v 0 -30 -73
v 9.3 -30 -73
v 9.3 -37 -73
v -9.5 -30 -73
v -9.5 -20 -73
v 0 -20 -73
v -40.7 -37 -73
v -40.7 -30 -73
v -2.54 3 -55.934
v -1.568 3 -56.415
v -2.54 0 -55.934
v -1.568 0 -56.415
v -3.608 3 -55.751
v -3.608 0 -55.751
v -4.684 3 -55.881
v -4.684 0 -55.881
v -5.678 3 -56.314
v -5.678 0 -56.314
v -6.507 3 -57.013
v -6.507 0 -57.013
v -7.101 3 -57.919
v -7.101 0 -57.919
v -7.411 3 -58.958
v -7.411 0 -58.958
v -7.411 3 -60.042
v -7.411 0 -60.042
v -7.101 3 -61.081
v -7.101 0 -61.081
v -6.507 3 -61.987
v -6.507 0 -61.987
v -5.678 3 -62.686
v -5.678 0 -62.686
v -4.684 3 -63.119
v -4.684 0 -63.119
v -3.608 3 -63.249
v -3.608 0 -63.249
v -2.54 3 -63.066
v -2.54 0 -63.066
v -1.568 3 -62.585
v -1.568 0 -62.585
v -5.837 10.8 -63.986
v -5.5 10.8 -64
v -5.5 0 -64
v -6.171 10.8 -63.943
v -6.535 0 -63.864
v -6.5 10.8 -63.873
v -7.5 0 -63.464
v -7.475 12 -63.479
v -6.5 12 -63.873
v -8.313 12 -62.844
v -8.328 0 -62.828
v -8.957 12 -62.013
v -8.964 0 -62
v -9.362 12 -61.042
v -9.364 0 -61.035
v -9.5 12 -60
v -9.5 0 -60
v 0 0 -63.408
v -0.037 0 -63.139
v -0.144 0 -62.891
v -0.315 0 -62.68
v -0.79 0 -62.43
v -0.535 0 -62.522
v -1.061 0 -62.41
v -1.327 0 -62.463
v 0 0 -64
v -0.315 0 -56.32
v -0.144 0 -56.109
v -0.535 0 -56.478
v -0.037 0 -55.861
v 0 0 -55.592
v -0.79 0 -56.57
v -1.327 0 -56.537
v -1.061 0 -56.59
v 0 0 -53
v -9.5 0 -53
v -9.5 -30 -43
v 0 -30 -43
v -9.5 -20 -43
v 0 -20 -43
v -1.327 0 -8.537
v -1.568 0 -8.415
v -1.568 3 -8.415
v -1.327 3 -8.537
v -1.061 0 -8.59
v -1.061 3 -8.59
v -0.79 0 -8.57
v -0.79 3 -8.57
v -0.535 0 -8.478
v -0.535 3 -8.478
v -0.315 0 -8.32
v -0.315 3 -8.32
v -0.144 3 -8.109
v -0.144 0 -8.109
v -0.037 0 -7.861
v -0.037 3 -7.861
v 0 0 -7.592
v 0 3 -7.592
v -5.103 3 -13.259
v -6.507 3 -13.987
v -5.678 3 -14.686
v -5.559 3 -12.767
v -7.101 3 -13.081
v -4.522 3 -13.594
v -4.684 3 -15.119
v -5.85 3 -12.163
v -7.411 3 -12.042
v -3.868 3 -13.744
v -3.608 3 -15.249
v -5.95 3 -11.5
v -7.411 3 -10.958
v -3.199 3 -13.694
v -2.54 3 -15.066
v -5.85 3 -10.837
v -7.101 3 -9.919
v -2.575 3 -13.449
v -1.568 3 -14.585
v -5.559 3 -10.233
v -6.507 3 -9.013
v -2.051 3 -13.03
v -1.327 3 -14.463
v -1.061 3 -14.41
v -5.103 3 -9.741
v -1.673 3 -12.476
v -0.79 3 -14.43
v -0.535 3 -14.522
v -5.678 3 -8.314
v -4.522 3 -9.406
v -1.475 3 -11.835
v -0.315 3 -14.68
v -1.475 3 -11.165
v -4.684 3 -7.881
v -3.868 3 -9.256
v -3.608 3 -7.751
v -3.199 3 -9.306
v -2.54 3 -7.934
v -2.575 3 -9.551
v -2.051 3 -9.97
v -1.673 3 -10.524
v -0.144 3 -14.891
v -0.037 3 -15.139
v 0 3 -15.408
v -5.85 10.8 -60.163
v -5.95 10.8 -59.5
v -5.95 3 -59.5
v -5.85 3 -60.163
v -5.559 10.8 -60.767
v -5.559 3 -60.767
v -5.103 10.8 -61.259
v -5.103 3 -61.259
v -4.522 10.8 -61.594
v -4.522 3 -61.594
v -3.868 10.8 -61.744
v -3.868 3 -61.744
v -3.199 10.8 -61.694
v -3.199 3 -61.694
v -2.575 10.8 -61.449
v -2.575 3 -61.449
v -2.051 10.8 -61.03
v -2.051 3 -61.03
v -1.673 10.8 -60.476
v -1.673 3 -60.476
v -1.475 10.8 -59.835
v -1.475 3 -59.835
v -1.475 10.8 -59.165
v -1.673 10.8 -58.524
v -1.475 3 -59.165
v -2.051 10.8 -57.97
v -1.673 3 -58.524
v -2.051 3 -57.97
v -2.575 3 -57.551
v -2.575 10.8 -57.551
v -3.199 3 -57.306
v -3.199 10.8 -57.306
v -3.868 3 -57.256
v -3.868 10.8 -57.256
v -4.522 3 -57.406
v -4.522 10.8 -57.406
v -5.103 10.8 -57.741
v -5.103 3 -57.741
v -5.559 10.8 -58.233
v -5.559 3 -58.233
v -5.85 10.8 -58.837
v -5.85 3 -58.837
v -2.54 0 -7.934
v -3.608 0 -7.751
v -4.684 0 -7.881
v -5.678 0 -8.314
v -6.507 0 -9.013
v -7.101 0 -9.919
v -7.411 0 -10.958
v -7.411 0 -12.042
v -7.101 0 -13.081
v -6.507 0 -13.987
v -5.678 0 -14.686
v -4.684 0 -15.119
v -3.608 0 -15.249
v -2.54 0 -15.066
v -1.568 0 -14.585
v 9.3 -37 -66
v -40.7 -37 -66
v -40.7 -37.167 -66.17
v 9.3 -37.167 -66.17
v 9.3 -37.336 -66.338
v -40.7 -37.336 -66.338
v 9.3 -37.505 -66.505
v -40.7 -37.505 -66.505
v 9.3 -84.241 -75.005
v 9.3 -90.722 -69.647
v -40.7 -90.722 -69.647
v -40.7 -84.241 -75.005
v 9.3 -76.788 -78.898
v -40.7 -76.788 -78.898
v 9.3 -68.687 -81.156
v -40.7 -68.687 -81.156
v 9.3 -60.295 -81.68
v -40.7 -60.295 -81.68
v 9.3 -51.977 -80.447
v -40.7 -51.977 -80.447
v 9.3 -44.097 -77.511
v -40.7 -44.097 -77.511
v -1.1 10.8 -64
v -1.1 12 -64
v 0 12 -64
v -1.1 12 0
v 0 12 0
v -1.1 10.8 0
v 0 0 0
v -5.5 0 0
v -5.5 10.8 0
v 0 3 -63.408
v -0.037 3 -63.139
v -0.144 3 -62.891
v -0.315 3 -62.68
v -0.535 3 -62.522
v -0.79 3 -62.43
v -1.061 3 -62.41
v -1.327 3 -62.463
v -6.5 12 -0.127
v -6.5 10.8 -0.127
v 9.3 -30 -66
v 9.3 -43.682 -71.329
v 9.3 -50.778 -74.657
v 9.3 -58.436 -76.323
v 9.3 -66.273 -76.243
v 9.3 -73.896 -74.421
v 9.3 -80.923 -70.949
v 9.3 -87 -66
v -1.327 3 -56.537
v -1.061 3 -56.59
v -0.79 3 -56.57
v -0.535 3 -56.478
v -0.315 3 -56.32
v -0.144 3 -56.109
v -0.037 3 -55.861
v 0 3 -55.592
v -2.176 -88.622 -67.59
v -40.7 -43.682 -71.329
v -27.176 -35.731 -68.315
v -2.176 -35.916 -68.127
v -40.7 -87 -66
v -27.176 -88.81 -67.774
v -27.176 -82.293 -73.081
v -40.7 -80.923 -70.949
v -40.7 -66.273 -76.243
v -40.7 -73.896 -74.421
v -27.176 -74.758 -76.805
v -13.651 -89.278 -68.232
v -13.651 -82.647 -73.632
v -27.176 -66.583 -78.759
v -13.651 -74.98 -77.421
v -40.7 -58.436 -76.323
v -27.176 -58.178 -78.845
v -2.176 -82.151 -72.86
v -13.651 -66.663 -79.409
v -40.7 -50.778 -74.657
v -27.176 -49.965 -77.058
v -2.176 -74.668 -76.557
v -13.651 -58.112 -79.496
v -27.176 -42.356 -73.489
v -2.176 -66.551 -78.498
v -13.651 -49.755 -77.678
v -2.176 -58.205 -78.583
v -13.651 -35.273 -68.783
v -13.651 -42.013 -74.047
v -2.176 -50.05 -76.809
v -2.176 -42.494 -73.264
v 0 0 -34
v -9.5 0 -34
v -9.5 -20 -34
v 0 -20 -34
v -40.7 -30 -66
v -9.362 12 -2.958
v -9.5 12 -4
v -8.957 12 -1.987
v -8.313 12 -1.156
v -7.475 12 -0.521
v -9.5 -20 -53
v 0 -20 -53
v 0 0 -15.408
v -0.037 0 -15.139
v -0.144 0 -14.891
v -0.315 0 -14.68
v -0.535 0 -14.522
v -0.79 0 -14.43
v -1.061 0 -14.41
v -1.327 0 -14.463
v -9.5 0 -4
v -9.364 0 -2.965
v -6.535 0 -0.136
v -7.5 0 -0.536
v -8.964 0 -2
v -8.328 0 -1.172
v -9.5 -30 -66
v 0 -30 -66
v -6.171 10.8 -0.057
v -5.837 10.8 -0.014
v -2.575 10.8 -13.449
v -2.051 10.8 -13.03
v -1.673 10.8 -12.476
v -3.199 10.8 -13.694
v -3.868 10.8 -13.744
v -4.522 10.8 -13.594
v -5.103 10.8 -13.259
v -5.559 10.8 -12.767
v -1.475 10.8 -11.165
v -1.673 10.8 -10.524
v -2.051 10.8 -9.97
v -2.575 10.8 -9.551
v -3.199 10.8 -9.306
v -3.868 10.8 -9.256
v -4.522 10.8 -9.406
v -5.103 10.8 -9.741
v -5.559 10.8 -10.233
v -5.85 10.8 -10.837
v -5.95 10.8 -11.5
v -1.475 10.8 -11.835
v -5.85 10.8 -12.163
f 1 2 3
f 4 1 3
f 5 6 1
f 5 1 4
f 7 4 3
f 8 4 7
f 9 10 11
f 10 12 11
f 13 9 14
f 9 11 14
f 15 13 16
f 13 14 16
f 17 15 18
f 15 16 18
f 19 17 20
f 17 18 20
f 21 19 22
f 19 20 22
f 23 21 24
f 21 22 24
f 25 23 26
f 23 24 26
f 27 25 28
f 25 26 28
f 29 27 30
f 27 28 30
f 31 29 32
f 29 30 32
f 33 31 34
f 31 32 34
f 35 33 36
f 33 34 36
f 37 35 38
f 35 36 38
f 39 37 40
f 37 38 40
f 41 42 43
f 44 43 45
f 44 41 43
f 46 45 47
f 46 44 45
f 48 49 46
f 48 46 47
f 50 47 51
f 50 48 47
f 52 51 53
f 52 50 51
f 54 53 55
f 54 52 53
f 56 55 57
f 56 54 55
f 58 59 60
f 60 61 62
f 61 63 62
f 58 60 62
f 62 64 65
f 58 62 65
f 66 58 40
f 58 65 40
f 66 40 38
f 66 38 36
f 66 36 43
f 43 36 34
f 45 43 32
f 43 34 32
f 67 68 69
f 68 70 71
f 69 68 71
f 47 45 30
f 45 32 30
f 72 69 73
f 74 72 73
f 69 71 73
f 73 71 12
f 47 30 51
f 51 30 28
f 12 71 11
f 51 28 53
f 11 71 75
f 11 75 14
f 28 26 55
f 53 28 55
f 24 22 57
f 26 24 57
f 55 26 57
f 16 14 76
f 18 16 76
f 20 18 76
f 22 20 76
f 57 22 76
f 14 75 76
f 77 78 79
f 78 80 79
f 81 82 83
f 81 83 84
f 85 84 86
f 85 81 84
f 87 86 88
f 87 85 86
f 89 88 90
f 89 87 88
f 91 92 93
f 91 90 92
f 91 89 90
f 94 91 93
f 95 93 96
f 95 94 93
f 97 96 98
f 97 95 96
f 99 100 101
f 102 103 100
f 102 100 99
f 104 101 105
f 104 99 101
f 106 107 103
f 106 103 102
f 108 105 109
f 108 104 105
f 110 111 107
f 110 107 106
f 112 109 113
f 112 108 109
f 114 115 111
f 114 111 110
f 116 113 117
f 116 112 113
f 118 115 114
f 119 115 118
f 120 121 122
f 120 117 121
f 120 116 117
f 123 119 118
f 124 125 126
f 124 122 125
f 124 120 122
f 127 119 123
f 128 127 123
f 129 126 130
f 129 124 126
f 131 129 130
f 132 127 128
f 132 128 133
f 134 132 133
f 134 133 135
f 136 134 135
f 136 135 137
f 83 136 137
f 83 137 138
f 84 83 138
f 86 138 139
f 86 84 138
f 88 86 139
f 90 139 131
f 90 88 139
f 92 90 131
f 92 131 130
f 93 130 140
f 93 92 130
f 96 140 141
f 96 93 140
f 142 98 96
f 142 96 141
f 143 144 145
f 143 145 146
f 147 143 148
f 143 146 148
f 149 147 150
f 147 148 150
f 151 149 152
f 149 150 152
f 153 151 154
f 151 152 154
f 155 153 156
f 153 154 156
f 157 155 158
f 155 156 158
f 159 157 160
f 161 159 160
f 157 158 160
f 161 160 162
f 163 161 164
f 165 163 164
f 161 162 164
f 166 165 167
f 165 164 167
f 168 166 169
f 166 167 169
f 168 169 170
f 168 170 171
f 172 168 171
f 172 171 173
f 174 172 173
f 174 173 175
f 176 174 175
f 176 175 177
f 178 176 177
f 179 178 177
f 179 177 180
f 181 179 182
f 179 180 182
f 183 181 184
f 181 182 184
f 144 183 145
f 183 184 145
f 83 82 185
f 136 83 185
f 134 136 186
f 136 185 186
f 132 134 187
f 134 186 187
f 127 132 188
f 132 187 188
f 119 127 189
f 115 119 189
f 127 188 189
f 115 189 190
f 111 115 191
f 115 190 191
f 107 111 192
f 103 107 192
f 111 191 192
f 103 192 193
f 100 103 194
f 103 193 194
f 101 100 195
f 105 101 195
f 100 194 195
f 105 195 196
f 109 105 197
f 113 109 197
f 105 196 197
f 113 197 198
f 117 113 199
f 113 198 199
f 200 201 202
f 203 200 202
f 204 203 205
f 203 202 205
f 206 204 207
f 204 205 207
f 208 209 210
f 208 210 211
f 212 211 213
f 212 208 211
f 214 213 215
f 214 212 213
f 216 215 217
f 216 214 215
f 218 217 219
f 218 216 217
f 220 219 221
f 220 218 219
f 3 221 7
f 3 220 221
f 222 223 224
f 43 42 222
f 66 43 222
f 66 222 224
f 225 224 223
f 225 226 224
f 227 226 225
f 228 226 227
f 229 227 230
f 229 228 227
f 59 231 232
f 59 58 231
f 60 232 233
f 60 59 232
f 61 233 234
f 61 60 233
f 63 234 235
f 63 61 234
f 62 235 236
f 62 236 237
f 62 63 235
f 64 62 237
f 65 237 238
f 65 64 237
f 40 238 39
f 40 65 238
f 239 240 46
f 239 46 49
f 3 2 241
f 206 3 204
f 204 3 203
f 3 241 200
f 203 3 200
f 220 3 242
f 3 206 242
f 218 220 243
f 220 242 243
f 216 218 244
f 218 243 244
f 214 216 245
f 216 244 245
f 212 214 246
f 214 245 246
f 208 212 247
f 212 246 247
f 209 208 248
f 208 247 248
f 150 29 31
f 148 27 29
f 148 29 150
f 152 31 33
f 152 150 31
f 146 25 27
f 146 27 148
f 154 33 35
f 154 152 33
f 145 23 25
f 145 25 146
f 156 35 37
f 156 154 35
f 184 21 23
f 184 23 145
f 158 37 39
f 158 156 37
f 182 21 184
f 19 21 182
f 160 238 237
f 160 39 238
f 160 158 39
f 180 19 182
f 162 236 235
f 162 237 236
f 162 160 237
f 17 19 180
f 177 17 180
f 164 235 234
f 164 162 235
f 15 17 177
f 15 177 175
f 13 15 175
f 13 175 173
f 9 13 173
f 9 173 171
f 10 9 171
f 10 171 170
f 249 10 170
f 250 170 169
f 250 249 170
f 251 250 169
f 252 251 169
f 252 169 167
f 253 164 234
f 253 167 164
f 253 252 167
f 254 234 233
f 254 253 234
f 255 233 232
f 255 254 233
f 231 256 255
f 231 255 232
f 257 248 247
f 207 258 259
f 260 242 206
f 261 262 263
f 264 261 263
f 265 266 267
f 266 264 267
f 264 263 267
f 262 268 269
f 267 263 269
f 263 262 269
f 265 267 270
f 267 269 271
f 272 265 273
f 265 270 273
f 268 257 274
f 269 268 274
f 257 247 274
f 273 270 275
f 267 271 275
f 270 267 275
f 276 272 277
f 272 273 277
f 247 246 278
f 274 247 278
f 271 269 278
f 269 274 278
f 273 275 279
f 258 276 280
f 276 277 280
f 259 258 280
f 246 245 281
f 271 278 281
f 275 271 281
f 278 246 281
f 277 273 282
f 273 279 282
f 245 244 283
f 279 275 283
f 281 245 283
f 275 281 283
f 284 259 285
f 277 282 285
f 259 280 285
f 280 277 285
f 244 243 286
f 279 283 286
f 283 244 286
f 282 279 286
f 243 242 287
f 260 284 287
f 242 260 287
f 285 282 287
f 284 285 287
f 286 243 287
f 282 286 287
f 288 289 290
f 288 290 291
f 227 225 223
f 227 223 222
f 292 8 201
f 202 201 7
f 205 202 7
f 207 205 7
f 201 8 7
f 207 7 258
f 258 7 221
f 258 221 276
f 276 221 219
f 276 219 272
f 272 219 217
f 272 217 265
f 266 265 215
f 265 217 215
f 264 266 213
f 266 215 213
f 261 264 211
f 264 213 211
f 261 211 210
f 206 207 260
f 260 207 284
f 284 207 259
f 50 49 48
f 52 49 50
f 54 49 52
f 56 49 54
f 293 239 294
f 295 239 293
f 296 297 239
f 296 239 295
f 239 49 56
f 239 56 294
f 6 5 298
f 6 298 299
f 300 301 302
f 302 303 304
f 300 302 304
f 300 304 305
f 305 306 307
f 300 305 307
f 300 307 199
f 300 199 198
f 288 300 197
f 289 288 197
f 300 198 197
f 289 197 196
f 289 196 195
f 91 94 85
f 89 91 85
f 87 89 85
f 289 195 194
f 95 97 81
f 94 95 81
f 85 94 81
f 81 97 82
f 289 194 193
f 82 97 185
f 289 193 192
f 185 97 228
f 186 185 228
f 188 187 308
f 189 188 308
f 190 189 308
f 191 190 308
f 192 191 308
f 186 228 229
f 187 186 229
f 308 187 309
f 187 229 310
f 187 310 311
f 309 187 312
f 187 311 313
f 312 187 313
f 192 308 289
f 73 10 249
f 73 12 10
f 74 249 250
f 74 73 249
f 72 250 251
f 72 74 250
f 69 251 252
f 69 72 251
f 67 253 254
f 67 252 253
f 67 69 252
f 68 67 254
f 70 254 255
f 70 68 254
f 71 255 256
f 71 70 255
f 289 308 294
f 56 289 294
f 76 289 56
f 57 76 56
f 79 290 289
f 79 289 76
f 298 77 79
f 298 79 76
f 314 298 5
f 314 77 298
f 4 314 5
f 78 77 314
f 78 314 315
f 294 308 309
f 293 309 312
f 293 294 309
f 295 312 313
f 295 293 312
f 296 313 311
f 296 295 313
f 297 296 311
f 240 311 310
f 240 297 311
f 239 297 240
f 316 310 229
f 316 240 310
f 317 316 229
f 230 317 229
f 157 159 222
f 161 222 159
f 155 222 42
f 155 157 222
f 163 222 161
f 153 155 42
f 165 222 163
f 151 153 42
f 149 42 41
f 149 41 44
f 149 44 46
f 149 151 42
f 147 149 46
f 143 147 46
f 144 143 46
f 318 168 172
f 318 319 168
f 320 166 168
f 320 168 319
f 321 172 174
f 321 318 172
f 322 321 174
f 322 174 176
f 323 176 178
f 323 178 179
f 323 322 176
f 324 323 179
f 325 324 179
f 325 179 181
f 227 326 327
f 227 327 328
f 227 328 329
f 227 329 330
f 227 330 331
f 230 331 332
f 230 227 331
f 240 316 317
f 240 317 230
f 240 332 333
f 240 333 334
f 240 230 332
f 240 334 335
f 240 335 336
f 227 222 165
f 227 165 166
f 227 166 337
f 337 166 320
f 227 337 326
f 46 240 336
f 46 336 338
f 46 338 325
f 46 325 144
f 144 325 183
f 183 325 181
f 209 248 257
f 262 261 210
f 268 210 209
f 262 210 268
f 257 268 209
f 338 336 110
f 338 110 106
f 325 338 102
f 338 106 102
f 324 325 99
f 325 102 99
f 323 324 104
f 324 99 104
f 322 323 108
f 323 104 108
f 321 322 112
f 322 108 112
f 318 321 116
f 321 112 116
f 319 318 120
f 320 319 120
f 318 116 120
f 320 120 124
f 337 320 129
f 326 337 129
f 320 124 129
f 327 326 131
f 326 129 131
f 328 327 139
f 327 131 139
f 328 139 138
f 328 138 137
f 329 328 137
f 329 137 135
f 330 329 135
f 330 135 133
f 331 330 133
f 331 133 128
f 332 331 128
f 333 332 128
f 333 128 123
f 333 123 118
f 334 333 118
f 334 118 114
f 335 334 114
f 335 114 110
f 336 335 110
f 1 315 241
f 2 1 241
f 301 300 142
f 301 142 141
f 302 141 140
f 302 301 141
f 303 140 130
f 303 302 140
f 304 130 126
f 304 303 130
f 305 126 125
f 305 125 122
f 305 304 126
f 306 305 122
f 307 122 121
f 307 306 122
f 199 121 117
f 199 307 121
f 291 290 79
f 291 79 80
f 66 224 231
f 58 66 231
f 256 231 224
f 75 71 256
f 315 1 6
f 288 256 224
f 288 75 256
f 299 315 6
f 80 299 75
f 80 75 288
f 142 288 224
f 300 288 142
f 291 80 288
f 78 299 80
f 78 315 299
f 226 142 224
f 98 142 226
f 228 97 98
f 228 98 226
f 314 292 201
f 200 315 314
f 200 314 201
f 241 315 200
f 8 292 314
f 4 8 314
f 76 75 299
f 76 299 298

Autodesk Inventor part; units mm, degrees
ref_plane "YZ Plane" through (0, 0, 0) normal (1, 0, 0) x (0, 1, 0)
ref_plane "XZ Plane" through (0, 0, 0) normal (0, 1, 0) x (-1, 0, 0)
ref_plane "XY Plane" through (0, 0, 0) normal (0, 0, 1) x (1, 0, 0)
sketch "Sketch1" plane through (0, 0, 0) normal (0, 1, 0) x (-1, 0, 0)
  line L0 (0, 0) -> (9.5, 0)
  line L1 (9.5, 0) -> (9.5, -64)
  line L2 (9.5, -64) -> (0, -64)
  line L3 (0, -64) -> (0, 0)
  circle A0 centre (3.7, -11.5) radius 2.25
  circle A1 centre (3.7, -59.5) radius 2.25
  line L4 (3.7, -11.5) -> (3.7, -59.5) construction
  dimension "d1" = 9.5
  dimension "d2" = 64
  dimension "d3" = 4.5
  dimension "d4" = 48
  dimension "d6" = 3.7
  dimension "d17" = 4.5
extrude "Extrusion1" add sketch "Sketch1" along normal blind 12
sketch "Sketch2" plane through (-9.5, 0, 0) normal (0, 0, 1) x (1, 0, 0)
  line L0 (9.5, 12) -> (0, 12) projected
  line L1 (3, 12) -> (8.4, 12)
  line L2 (8.4, 12) -> (8.4, 10.8)
  line L3 (8.4, 10.8) -> (3, 10.8)
  line L4 (3, 10.8) -> (3, 12)
  line L5 (9.5, 0) -> (9.5, 12) projected
  line L6 (3.55, 0) -> (8.05, 0) projected
  line L7 (3.55, 12) -> (8.05, 12) projected
  line L8 (9.5, 0) -> (9.5, 12) projected
  line L9 (9.5, 0) -> (9.5, 12) projected
  line L10 (3.55, 12) -> (8.05, 12) projected
  line L11 (3.55, 12) -> (3.55, 0) projected
  line L12 (3.55, 12) -> (8.05, 12) projected
  line L13 (3.55, 0) -> (8.05, 0) projected
  line L14 (3.55, 12) -> (8.05, 12) projected
  line L15 (3.55, 0) -> (8.05, 0) projected
  line L16 (3.55, 12) -> (8.05, 12) projected
  line L17 (3.55, 0) -> (8.05, 0) projected
  dimension "d9" = 1.1
  dimension "d10" = 5.4
  dimension "d11" = 1.2
  dimension "d76" = 12
extrude "Extrusion2" cut sketch "Sketch2" against normal up to next
sketch "Sketch3" plane through (0, 0, 0) normal (0, -1, 0) x (1, 0, 0)
  circle A0 centre (-3.7, -11.5) radius 2.25 projected
  circle A1 centre (-3.7, -11.5) radius 3.75
  circle A2 centre (-3.7, -59.5) radius 2.25 projected
  circle A3 centre (-3.7, -59.5) radius 3.75
  point P0 (0, 0)
  dimension "d14" = 7.5
extrude "Extrusion3" cut sketch "Sketch3" against normal blind 3
fillet "Fillet1" radius 1 4 edges at (0, 1.5, -58.8897) (0, 1.5, -60.1103) (0, 1.5, -10.8897) (0, 1.5, -12.1103)
fillet "Fillet2" radius 4 2 edges at (-9.5, 6, -64) (-9.5, 6, 0)
sketch "Sketch28" plane through (0, 0, 0) normal (0, -1, 0) x (1, 0, 0)
  arc A0 (-1.5684, -56.4147) -> (0, -55.592) centre (-1, -55.592) ccw projected
  line L0 (0, -55.592) -> (0, -53)
  line L1 (0, -15.408) -> (0, -55.592) projected
  line L2 (-9.5, -60) -> (-9.5, -4) projected
  line L3 (0, -53) -> (-9.5, -53)
  line L4 (-9.5, -53) -> (-9.5, -34)
  line L5 (-9.5, -34) -> (0, -34)
  line L6 (0, -34) -> (0, -53)
  point P0 (0, 0)
  point P1 (0, -34)
  dimension "d107" = 2.592
  dimension "d108" = 19
extrude "Extrusion19" add sketch "Sketch28" along normal blind 20
sketch "Sketch40" plane through (0, -20, 0) normal (0, -1, 0) x (1, 0, 0)
  line L0 (0, -53) -> (-9.5, -53) projected
  line L1 (-9.5, -53) -> (-9.5, -73)
  line L2 (-9.5, -73) -> (0, -73)
  line L3 (0, -73) -> (0, -43)
  line L4 (0, 0) -> (0, -64) projected
  line L5 (0, -43) -> (-9.5, -43)
  line L6 (-9.5, -43) -> (-9.5, -53)
  line L7 (-9.5, -43) -> (0, -43)
  line L8 (0, -43) -> (0, -73)
  line L9 (0, -73) -> (-9.5, -73)
  line L10 (-9.5, -73) -> (-9.5, -43)
  dimension "d130" = 20
  dimension "d131" = 30
extrude "Extrusion21" add sketch "Sketch40" along normal blind 10
sketch "Sketch41" plane through (0, 0, -53) normal (0, 0, -1) x (-1, 0, 0)
  point P0 (0, 0)
sketch "Sketch42" plane through (0, -30, 0) normal (0, -1, 0) x (1, 0, 0)
  line L0 (-9.5, -73) -> (0, -73) projected
  line L1 (-9.5, -73) -> (-40.7, -73)
  line L2 (-9.5, -73) -> (21.7, -73) construction
  line L3 (-40.7, -73) -> (-40.7, -66)
  line L4 (-40.7, -66) -> (9.3, -66)
  line L5 (9.3, -66) -> (9.3, -73)
  line L6 (9.3, -73) -> (-9.5, -73)
  point P0 (0, 0)
  point P1 (0, -73)
  dimension "d134" = 31.2
  dimension "d135" = 180
  dimension "d136" = 7
  dimension "d137" = 50
  dimension "d138" = 7
extrude "Extrusion22" add sketch "Sketch42" along normal blind 7
sketch "Sketch43" plane through (-40.7, -30, -73) normal (-1, 0, 0) x (0, 0, 1)
  arc A0 (7, -7) -> (7, -57) centre (31.4949, -32) ccw
  point P0 (73, 30)
  dimension "d141" = 50
  dimension "d142" = 35
sketch "Sketch44" plane through (0, -37, 0) normal (0, -1, 0) x (1, 0, 0)
  line L0 (9.3, -73) -> (9.3, -66) projected
  line L1 (-40.7, -73) -> (-9.5, -73) projected
  line L2 (9.3, -66) -> (-40.7, -66)
  line L3 (-40.7, -66) -> (-40.7, -73)
  line L4 (-40.7, -73) -> (9.3, -73)
  line L5 (9.3, -73) -> (9.3, -66)
  point P0 (0, 0)
  point P1 (-9.5, -73)
sweep "Sweep3" add profiles "Sketch44" path "Sketch43"
sketch "Sketch46" plane through (-40.7, -30, -73) normal (-1, 0, 0) x (0, 0, 1)
  arc A0 (7, -7) -> (7, -57) centre (31.4949, -32) ccw projected
  circle A1 centre (31.4949, -32) radius 35 construction
  line L0 (31.4949, -32) -> (3.353, -60.7222)
  arc A2 (0, -7) -> (7.1429, -63.9985) centre (31.4949, -32) ccw projected
  line L1 (31.4949, -32) -> (7.1429, -63.9985)
  point P0 (73, 30)
extrude "Extrusion23" cut sketch "Sketch46" against normal up to surface (50 mm away)
sketch "Sketch47" plane through (-40.7, -87, -66) normal (0, -0.6998542, 0.7142857) x (1, 0, 0)
  line L0 (0, 30.8153) -> (0, -5.2111) projected
  line L1 (0, -3.2111) -> (50, -3.2111) construction
  line L2 (50, 30.8153) -> (50, -5.2111) projected
  line L3 (50, 0) -> (0, 0) projected
  line L4 (0, 0) -> (25, -6.4221) construction
  line L5 (25, -6.4221) -> (50, 0) construction
  spline S0 degree 2 poles (0, 0) (25, -6.4221) (50, 0) knots 1 1 1 2 2 2
  line L6 (0, 0) -> (50, 0)
  line L7 (50, -5.2111) -> (0, -5.2111) projected
  line L8 (60.7, 35) -> (-10.7, 35) projected
  point P0 (40.7, 108.3332)
  dimension "d149" = 2
revolve "Revolution2" cut sketch "Sketch47" angle 90 about axis through (-15.7, -62, -41.5051) along (1, 0, 0) contours L3 S0
sketch "Sketch48" plane through (-40.7, -90.7222, -69.647) normal (0, -0.6998542, 0.7142857) x (1, 0, 0)
  point P0 (40.7, 113.5443)
properties part number "Back"
